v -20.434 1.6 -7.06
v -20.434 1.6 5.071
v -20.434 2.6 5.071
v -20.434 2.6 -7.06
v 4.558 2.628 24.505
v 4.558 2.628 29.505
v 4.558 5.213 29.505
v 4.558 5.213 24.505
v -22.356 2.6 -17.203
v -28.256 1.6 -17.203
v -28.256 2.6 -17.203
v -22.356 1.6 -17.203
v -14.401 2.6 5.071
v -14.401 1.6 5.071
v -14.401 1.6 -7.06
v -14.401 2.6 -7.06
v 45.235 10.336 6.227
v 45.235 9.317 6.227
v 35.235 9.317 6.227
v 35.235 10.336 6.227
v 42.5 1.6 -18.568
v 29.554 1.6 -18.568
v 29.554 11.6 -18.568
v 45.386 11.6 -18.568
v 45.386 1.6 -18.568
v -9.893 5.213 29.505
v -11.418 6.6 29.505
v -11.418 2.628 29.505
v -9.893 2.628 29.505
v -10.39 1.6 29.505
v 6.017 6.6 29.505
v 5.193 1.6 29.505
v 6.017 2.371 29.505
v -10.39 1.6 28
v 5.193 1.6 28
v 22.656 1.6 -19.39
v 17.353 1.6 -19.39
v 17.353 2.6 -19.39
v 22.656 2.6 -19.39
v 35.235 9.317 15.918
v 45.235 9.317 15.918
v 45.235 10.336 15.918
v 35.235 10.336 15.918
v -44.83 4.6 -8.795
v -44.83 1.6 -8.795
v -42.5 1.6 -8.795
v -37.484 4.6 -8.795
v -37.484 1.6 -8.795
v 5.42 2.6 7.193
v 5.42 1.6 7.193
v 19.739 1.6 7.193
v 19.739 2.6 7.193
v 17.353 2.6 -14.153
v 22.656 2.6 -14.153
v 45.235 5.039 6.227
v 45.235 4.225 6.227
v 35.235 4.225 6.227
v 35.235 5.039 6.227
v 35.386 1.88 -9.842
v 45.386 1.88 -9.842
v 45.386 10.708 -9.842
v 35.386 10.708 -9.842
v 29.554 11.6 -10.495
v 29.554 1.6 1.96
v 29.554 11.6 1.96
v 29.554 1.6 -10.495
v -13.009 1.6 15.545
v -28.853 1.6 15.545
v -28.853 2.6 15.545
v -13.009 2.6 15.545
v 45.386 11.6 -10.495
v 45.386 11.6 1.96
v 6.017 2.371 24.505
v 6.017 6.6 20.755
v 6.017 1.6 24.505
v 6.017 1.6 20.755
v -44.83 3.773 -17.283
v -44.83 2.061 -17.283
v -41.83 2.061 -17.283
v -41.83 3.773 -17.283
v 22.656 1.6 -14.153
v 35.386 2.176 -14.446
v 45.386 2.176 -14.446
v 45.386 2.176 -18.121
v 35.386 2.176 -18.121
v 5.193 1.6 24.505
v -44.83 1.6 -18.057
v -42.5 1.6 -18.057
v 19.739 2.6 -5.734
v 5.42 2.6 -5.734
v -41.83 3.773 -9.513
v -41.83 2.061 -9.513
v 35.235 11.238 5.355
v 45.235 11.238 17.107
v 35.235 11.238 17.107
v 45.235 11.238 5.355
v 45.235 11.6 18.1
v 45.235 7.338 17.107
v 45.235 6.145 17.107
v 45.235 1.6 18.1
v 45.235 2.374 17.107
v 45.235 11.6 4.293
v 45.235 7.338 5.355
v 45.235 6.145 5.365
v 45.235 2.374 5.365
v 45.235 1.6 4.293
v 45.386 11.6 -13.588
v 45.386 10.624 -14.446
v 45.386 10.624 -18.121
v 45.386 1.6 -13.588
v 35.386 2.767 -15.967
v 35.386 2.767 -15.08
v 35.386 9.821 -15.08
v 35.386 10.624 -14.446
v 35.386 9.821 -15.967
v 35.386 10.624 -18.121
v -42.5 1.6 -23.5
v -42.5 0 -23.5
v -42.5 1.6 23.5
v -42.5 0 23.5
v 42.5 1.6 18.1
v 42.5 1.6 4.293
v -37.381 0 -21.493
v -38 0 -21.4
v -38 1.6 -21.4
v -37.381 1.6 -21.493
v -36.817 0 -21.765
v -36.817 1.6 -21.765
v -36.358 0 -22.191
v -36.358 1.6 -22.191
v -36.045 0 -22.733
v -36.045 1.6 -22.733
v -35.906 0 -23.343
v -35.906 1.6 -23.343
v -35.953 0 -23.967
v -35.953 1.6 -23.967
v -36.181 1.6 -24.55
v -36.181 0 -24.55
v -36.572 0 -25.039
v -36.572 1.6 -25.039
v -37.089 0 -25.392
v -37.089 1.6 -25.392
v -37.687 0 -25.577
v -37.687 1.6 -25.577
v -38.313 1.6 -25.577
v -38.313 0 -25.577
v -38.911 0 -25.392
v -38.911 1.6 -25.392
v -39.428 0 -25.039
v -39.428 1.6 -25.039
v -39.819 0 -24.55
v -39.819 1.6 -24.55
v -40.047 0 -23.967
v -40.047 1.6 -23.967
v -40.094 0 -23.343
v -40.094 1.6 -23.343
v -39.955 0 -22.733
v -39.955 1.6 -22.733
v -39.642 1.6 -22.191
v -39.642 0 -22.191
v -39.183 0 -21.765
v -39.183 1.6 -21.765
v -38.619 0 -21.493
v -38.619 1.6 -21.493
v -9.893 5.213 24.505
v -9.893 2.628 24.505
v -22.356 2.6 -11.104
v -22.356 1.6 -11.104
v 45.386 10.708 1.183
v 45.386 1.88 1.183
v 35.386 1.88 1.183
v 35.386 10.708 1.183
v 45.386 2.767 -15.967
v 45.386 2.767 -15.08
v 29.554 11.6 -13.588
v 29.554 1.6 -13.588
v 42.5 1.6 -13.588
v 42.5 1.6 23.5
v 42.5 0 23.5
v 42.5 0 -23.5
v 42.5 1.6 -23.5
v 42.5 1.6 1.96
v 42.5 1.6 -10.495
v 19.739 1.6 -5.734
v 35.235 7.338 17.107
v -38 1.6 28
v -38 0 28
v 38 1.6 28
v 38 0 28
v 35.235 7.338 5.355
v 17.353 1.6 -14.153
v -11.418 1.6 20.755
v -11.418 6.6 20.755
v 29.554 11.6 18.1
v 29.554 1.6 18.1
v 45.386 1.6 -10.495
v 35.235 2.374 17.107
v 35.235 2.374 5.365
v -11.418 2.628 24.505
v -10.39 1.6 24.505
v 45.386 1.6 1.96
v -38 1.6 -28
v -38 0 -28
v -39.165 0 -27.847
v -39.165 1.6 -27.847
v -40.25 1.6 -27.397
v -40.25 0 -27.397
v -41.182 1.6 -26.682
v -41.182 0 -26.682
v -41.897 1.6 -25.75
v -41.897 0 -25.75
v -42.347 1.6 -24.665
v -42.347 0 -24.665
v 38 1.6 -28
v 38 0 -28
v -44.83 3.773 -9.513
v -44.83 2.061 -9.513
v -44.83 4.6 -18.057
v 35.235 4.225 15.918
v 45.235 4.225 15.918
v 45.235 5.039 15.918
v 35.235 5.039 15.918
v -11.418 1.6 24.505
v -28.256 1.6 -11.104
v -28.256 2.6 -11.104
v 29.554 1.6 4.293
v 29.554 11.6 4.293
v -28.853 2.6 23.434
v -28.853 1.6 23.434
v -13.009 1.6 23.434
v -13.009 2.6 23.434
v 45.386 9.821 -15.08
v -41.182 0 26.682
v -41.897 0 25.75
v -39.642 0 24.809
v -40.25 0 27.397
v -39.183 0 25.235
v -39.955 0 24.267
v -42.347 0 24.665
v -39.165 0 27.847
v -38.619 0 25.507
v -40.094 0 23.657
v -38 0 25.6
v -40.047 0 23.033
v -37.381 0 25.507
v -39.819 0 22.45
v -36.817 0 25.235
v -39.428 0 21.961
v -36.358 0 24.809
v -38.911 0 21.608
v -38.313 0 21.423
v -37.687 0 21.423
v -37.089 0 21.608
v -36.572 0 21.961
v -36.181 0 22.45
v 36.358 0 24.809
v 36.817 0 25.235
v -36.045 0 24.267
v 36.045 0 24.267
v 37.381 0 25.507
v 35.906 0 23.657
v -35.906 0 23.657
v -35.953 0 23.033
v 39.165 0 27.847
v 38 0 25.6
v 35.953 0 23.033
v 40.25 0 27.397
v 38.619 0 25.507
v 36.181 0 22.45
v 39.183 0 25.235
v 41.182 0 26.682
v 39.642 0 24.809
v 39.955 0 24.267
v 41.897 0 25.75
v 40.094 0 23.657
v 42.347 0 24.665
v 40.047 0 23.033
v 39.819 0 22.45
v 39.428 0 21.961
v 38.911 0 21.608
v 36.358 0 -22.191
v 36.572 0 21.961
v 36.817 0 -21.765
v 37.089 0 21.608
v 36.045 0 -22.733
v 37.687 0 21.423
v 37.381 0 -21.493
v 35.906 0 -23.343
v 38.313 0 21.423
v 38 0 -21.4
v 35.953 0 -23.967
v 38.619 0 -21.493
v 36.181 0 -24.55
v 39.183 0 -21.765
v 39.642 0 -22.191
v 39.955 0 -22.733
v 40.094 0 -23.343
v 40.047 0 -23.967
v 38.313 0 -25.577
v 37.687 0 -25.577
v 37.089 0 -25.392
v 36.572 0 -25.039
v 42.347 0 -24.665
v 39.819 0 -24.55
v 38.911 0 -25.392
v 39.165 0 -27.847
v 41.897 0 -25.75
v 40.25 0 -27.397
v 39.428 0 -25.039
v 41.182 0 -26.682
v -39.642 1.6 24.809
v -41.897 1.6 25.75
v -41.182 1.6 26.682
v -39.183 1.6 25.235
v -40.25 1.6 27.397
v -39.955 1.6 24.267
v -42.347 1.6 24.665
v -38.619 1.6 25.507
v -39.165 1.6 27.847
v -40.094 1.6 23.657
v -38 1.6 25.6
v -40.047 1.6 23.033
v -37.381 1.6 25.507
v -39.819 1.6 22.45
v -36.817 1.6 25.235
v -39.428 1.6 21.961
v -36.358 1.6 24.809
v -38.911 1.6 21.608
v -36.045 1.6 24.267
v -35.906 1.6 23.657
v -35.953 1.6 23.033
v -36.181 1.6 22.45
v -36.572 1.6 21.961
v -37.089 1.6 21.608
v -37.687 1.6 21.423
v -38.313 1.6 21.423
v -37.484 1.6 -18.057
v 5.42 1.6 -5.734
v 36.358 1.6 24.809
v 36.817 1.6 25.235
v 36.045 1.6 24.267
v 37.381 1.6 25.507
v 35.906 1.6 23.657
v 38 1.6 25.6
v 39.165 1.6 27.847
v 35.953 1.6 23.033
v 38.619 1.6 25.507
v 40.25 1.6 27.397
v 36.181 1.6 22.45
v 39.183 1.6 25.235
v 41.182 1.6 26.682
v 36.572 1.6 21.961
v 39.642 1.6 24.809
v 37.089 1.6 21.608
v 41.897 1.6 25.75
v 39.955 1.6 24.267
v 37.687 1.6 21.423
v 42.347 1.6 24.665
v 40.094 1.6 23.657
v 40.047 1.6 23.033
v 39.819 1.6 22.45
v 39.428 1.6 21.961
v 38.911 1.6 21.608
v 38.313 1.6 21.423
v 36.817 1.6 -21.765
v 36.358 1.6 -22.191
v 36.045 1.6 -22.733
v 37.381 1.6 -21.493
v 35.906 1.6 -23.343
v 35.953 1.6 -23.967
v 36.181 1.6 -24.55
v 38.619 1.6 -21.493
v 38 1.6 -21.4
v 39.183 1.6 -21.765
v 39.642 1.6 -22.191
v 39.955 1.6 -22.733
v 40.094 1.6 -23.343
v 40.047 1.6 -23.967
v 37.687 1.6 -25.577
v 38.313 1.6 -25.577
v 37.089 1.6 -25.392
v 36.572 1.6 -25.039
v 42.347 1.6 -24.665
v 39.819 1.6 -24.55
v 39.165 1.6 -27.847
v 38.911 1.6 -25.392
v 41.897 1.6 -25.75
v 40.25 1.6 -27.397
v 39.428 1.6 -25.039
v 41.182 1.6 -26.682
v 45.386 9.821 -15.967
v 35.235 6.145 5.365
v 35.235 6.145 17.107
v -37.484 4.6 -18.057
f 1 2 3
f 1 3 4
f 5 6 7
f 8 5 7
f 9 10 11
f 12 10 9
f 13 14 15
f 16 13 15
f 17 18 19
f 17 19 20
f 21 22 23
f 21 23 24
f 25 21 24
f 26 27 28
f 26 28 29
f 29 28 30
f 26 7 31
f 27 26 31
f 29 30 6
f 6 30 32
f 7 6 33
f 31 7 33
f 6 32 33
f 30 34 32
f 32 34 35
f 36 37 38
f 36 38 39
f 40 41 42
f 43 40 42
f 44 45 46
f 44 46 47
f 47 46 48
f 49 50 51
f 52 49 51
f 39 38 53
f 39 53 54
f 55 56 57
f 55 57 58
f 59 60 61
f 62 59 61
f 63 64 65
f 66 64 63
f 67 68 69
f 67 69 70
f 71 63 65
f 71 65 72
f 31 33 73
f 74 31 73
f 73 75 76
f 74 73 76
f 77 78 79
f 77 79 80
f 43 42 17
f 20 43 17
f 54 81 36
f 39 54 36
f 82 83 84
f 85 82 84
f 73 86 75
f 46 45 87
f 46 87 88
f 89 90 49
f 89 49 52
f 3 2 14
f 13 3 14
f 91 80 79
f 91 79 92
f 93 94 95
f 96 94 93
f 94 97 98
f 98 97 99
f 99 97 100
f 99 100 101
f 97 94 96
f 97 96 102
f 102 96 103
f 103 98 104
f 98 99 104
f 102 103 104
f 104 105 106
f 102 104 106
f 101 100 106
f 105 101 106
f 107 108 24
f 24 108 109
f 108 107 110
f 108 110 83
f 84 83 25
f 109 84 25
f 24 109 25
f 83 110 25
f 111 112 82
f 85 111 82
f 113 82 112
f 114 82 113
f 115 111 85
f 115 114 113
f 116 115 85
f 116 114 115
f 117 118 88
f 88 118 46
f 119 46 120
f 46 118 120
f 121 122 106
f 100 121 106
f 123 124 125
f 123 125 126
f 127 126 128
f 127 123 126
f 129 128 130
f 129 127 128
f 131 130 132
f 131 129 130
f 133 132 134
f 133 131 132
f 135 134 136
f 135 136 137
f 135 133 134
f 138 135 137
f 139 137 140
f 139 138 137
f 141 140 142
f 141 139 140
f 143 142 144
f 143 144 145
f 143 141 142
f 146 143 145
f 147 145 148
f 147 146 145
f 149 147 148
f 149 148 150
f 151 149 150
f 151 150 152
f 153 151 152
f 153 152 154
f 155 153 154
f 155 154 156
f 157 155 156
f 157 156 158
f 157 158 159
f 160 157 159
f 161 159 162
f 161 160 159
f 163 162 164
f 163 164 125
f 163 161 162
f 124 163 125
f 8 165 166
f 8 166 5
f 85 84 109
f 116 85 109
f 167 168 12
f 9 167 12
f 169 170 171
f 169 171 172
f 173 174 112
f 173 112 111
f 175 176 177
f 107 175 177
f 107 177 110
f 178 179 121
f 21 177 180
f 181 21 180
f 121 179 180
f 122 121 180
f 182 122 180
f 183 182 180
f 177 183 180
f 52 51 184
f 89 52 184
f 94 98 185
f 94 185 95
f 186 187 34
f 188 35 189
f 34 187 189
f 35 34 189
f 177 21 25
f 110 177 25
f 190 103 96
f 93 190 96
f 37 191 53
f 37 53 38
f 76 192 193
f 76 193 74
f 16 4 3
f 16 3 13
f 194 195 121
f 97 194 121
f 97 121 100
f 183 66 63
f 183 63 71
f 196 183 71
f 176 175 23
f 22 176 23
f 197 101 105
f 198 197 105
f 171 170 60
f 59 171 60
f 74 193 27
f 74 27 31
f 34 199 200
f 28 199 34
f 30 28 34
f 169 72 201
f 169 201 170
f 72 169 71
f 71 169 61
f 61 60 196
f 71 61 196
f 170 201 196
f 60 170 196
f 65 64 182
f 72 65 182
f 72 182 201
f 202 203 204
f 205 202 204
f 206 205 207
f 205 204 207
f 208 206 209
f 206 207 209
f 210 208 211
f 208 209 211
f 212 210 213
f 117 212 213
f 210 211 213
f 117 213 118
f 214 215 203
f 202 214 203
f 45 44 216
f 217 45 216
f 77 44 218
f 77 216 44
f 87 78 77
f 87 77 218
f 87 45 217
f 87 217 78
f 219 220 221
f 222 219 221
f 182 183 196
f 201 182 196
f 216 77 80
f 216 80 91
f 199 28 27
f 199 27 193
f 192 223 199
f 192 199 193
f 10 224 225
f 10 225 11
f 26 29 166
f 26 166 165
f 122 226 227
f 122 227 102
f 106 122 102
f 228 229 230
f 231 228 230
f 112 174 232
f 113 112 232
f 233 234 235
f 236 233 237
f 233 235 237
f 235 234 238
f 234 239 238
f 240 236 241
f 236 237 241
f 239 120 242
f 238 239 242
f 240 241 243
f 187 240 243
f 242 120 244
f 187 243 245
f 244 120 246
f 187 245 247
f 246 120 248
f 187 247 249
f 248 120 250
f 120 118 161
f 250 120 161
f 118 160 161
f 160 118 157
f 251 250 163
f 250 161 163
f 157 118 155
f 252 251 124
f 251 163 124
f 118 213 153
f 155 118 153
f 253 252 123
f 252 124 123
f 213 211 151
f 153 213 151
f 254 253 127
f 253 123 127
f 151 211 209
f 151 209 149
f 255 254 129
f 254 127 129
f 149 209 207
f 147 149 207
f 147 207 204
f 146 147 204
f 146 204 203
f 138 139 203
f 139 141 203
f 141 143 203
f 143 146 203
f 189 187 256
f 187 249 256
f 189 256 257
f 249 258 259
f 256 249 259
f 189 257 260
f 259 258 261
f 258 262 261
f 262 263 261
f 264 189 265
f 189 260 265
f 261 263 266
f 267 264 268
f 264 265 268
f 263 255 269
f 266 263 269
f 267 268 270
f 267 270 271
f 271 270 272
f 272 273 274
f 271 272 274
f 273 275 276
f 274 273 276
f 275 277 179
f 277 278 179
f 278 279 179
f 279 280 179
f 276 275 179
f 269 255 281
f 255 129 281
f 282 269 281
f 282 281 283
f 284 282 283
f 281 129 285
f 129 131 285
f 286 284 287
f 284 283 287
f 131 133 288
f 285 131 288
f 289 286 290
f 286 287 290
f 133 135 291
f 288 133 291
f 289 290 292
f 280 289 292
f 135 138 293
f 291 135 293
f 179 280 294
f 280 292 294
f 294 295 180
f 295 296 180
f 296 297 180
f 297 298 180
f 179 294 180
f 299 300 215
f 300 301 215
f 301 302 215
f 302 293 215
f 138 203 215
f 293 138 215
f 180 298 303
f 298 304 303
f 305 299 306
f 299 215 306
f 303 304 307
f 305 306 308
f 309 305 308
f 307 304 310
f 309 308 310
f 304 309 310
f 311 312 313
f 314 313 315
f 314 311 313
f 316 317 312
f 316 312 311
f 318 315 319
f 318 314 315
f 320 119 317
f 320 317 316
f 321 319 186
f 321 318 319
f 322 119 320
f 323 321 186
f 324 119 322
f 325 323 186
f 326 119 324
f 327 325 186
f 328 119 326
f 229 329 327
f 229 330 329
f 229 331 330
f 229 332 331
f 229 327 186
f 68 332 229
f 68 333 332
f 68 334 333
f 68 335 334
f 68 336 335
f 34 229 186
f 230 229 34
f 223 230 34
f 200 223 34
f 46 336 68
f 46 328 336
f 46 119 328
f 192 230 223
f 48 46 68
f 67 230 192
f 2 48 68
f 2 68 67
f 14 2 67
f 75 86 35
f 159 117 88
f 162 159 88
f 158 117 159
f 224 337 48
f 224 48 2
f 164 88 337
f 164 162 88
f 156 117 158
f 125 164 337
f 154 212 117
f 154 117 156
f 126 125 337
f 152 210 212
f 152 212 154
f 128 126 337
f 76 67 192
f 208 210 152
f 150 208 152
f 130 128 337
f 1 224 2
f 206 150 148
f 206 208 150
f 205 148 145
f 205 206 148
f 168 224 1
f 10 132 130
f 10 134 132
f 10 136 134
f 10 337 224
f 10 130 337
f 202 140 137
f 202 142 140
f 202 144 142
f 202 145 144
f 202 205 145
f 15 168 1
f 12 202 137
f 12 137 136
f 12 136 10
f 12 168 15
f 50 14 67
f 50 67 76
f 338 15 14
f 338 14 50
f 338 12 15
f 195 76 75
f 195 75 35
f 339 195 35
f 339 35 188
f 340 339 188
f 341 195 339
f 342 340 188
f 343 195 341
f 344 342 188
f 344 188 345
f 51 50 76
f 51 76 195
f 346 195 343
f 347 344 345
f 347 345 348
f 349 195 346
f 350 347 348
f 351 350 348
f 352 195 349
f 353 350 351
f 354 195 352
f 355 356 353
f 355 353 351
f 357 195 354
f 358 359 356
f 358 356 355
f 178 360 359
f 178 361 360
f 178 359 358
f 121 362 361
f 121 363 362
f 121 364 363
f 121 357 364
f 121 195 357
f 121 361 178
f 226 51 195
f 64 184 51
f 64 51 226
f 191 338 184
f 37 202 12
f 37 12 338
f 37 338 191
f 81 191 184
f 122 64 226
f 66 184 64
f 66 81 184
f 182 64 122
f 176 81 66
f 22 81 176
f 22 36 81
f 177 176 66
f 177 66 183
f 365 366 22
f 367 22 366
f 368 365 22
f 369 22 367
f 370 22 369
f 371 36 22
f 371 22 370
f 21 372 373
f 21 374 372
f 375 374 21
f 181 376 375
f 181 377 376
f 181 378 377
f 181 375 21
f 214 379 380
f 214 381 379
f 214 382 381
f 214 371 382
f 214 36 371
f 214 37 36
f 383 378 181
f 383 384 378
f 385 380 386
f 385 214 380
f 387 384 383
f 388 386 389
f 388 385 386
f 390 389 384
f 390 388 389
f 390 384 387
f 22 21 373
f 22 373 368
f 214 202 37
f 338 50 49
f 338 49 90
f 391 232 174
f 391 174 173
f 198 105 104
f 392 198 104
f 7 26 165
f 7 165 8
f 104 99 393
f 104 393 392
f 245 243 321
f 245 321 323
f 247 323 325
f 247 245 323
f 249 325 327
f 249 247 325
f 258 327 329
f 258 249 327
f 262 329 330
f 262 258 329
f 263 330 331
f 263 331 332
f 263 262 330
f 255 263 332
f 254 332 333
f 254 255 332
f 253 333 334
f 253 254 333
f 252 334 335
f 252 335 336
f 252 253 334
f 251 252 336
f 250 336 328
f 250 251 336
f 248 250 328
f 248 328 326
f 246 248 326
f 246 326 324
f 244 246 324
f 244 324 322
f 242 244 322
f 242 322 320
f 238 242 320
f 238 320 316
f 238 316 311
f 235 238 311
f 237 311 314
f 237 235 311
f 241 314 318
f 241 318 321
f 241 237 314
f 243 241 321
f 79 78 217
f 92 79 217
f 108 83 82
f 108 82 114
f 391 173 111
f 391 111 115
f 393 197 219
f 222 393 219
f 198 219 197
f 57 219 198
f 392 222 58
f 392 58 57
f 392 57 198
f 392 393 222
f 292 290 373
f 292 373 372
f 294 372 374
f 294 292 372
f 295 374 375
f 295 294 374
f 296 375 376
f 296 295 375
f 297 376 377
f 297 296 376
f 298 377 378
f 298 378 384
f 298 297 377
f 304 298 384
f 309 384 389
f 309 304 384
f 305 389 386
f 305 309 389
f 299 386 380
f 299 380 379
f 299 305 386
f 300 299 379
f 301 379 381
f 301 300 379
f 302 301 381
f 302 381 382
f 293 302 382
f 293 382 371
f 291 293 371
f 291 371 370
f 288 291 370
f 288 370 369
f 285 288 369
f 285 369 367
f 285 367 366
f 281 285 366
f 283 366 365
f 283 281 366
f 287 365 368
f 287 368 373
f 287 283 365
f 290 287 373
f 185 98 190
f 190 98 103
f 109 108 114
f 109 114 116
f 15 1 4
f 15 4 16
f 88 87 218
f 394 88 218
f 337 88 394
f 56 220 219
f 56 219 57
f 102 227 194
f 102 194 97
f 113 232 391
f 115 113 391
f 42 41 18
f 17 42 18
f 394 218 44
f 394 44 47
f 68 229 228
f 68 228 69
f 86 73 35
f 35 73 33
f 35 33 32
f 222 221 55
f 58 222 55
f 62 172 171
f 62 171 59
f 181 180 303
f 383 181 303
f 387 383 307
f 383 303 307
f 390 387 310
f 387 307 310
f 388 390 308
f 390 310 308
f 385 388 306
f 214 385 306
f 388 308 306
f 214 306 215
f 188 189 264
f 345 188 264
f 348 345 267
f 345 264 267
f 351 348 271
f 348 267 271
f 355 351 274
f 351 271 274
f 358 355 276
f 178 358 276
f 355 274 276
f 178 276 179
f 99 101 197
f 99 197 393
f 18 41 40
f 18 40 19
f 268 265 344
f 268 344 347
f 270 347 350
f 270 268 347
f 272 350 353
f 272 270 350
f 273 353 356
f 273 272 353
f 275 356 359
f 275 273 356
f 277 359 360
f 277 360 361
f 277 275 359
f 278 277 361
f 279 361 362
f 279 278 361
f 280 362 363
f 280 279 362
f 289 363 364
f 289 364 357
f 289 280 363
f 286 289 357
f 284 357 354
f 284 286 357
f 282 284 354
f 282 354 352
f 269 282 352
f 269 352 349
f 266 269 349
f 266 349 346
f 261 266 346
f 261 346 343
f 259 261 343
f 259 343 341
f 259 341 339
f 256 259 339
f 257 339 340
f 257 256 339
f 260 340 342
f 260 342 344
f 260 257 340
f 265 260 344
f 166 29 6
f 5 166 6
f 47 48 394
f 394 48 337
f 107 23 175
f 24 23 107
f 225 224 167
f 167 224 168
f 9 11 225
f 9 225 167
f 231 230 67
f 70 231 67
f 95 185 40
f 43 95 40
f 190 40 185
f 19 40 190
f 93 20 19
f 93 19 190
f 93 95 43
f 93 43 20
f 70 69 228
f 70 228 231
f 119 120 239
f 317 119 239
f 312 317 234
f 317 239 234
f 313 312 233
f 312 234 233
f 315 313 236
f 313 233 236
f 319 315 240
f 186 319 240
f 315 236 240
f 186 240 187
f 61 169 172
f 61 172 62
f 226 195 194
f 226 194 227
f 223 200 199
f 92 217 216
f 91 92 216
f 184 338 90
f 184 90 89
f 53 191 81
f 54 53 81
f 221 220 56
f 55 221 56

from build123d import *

# Parameters (mm, degrees)
SKETCH_1_R          = 2.1
EXTRUDE_1_DEPTH     = 1.6
SKETCH_2_W          = 15.831082037
SKETCH_2_H          = 12.45501042
SKETCH_2_W_2        = 15.680188414
SKETCH_2_H_2        = 13.80676649
SKETCH_2_H_3        = 4.979489554
EXTRUDE_2_DEPTH     = 10
SKETCH_4_W          = 11.752987814
SKETCH_4_H          = 3.899349988
SKETCH_4_W_2        = 9.690175718
SKETCH_4_H_2        = 1.018486937
SKETCH_4_W_3        = 11.742918051
SKETCH_4_H_3        = 3.771361158
SKETCH_4_H_4        = 0.81478955
CUT_EXTRUDE_1_DEPTH = 10
SKETCH_5_W          = 11.02482594
SKETCH_5_H          = 8.828308894
CUT_EXTRUDE_3_DEPTH = 10
SKETCH_6_W          = 3.67494198
SKETCH_6_H          = 8.448142483
SKETCH_6_W_2        = 0.887054961
SKETCH_6_H_2        = 7.054198973
CUT_EXTRUDE_4_DEPTH = 10
SKETCH_7_W          = 14.31905698
SKETCH_7_H          = 12.92692644
SKETCH_7_W_2        = 6.032565672
SKETCH_7_H_2        = 12.131423274
SKETCH_7_W_3        = 5.899981811
SKETCH_7_H_3        = 6.098857603
SKETCH_7_W_4        = 5.303354437
SKETCH_7_H_4        = 5.237062506
SKETCH_7_W_5        = 15.84377138
SKETCH_7_H_5        = 7.888739725
EXTRUDE_3_DEPTH     = 1
SKETCH_8_W          = 17.434777712
SKETCH_8_H          = 8.750534821
EXTRUDE_4_DEPTH     = 5
SKETCH_9_W          = 14.45164084
SKETCH_9_H          = 2.585385288
CUT_EXTRUDE_5_DEPTH = 5
SKETCH_10_W         = 7.345813671
SKETCH_10_H         = 9.262112889
EXTRUDE_5_DEPTH     = 3
SKETCH_11_W         = 7.769719093
SKETCH_11_H         = 1.711972004
CUT_EXTRUDE_6_DEPTH = 3


with BuildPart() as part:
    # 草图1 → 凸台-拉伸1 (new body)
    with BuildSketch(Plane(origin=(0, 0, 0), x_dir=(1, 0, 0), z_dir=(0, 1, 0))):
        with BuildLine():
            Line((-38, -28), (38, -28))
            ThreePointArc((38, -28), (41.181980515, -26.681980515), (42.5, -23.5))
            Line((42.5, -23.5), (42.5, 23.5))
            ThreePointArc((42.5, 23.5), (41.181980515, 26.681980515), (38, 28))
            Line((38, 28), (-38, 28))
            ThreePointArc((-38, 28), (-41.181980515, 26.681980515), (-42.5, 23.5))
            Line((-42.5, 23.5), (-42.5, -23.5))
            ThreePointArc((-42.5, -23.5), (-41.181980515, -26.681980515), (-38, -28))
        make_face()
        with Locations(Location((-38, 23.5, 0), (0, 0, 270))):
            Circle(SKETCH_1_R, mode=Mode.SUBTRACT)
        with Locations(Location((38, 23.5, 0), (0, 0, 270))):
            Circle(SKETCH_1_R, mode=Mode.SUBTRACT)
        with Locations(Location((38, -23.5, 0), (0, 0, 270))):
            Circle(SKETCH_1_R, mode=Mode.SUBTRACT)
        with Locations(Location((-38, -23.5, 0), (0, 0, 270))):
            Circle(SKETCH_1_R, mode=Mode.SUBTRACT)
    extrude(amount=EXTRUDE_1_DEPTH)

    # 草图2 → 凸台-拉伸2 (add)
    with BuildSketch(Plane(origin=(0, 1.6, 0), x_dir=(1, 0, 0), z_dir=(0, 1, 0))):
        with Locations((37.470005744, 4.267247856)):
            Rectangle(SKETCH_2_W, SKETCH_2_H)
        with Locations((37.394558932, -11.196205219)):
            Rectangle(SKETCH_2_W_2, SKETCH_2_H_2)
        with Locations((37.470005744, 16.077817111)):
            Rectangle(SKETCH_2_W, SKETCH_2_H_3)
    extrude(amount=EXTRUDE_2_DEPTH)

    # 草图4 → 切除-拉伸1 (cut)
    # profile 1 of 2: a face of its own
    with BuildSketch(Plane(origin=(45.234653139, 0, 0), x_dir=(0, 0, -1), z_dir=(1, 0, 0))):
        with Locations((-11.23099462, 9.288009883)):
            Rectangle(SKETCH_4_W, SKETCH_4_H)
        with Locations((-11.072577375, 9.826352979)):
            Rectangle(SKETCH_4_W_2, SKETCH_4_H_2, mode=Mode.SUBTRACT)
    # profile 2 of 2: a face of its own
    with BuildSketch(Plane(origin=(45.234653139, 0, 0), x_dir=(0, 0, -1), z_dir=(1, 0, 0))):
        with Locations((-11.236029502, 4.259569612)):
            Rectangle(SKETCH_4_W_3, SKETCH_4_H_3)
        with Locations((-11.072577375, 4.632069598)):
            Rectangle(SKETCH_4_W_2, SKETCH_4_H_4, mode=Mode.SUBTRACT)
    extrude(amount=-CUT_EXTRUDE_1_DEPTH, mode=Mode.SUBTRACT)

    # 草图5 → 切除-拉伸3 (cut)
    with BuildSketch(Plane(origin=(45.385546762, 0, 0), x_dir=(0, 0, -1), z_dir=(1, 0, 0))):
        with Locations((4.329673022, 6.294177297)):
            Rectangle(SKETCH_5_W, SKETCH_5_H)
    extrude(amount=-CUT_EXTRUDE_3_DEPTH, mode=Mode.SUBTRACT)

    # 草图6 → 切除-拉伸4 (cut)
    with BuildSketch(Plane(origin=(45.385546762, 0, 0), x_dir=(0, 0, -1), z_dir=(1, 0, 0))):
        with Locations((16.283794635, 6.399779078)):
            Rectangle(SKETCH_6_W, SKETCH_6_H)
        with Locations((15.523461812, 6.294177298)):
            Rectangle(SKETCH_6_W_2, SKETCH_6_H_2, mode=Mode.SUBTRACT)
    extrude(amount=-CUT_EXTRUDE_4_DEPTH, mode=Mode.SUBTRACT)

    # 草图7 → 凸台-拉伸3 (add)
    with BuildSketch(Plane(origin=(0, 1.6, 0), x_dir=(1, 0, 0), z_dir=(0, 1, 0))):
        with Locations((12.579817698, -0.729211235)):
            Rectangle(SKETCH_7_W, SKETCH_7_H)
        with Locations((-17.417280836, 0.994378957)):
            Rectangle(SKETCH_7_W_2, SKETCH_7_H_2)
        with Locations((-25.306020561, 14.153327154)):
            Rectangle(SKETCH_7_W_3, SKETCH_7_H_3)
        with Locations((20.004513911, 16.771858407)):
            Rectangle(SKETCH_7_W_4, SKETCH_7_H_4)
        with Locations((-20.93075315, -19.489827555)):
            Rectangle(SKETCH_7_W_5, SKETCH_7_H_5)
    extrude(amount=EXTRUDE_3_DEPTH)

    # 草图8 → 凸台-拉伸4 (add)
    with BuildSketch(Plane(origin=(0, 1.6, 0), x_dir=(1, 0, 0), z_dir=(0, 1, 0))):
        with Locations((-2.700472273, -25.129807113)):
            Rectangle(SKETCH_8_W, SKETCH_8_H)
    extrude(amount=EXTRUDE_4_DEPTH)

    # 草图9 → 切除-拉伸5 (cut)
    with BuildSketch(Plane.XY.offset(29.505074523)):
        Polygon((-11.417861129, 1.6), (-11.417861129, 2.627524922), (-10.390336207, 1.6), align=None)
        with Locations((-2.667326308, 3.920217566)):
            Rectangle(SKETCH_9_W, SKETCH_9_H)
        Polygon((6.016916583, 1.6), (6.016916583, 2.370567657), (5.192747103, 1.6), align=None)
    extrude(amount=-CUT_EXTRUDE_5_DEPTH, mode=Mode.SUBTRACT)

    # 草图10 → 凸台-拉伸5 (add)
    with BuildSketch(Plane(origin=(0, 1.6, 0), x_dir=(1, 0, 0), z_dir=(0, 1, 0))):
        with Locations((-41.156730333, 13.42606725)):
            Rectangle(SKETCH_10_W, SKETCH_10_H)
    extrude(amount=EXTRUDE_5_DEPTH)

    # 草图11 → 切除-拉伸6 (cut)
    with BuildSketch(Plane.ZY.offset(44.829637168)):
        with Locations((-13.398155788, 2.916901541)):
            Rectangle(SKETCH_11_W, SKETCH_11_H)
    extrude(amount=-CUT_EXTRUDE_6_DEPTH, mode=Mode.SUBTRACT)


solid = part.part
